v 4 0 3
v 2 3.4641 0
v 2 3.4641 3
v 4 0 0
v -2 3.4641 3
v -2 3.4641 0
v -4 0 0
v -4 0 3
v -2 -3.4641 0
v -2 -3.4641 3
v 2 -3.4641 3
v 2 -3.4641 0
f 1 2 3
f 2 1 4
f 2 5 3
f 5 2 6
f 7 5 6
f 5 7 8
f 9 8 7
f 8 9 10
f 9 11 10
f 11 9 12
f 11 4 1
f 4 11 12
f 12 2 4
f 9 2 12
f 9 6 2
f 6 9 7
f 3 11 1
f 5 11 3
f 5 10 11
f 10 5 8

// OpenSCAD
radius = 4;
height = 3;
cylinder(r=radius, h=height, $fn=6);
